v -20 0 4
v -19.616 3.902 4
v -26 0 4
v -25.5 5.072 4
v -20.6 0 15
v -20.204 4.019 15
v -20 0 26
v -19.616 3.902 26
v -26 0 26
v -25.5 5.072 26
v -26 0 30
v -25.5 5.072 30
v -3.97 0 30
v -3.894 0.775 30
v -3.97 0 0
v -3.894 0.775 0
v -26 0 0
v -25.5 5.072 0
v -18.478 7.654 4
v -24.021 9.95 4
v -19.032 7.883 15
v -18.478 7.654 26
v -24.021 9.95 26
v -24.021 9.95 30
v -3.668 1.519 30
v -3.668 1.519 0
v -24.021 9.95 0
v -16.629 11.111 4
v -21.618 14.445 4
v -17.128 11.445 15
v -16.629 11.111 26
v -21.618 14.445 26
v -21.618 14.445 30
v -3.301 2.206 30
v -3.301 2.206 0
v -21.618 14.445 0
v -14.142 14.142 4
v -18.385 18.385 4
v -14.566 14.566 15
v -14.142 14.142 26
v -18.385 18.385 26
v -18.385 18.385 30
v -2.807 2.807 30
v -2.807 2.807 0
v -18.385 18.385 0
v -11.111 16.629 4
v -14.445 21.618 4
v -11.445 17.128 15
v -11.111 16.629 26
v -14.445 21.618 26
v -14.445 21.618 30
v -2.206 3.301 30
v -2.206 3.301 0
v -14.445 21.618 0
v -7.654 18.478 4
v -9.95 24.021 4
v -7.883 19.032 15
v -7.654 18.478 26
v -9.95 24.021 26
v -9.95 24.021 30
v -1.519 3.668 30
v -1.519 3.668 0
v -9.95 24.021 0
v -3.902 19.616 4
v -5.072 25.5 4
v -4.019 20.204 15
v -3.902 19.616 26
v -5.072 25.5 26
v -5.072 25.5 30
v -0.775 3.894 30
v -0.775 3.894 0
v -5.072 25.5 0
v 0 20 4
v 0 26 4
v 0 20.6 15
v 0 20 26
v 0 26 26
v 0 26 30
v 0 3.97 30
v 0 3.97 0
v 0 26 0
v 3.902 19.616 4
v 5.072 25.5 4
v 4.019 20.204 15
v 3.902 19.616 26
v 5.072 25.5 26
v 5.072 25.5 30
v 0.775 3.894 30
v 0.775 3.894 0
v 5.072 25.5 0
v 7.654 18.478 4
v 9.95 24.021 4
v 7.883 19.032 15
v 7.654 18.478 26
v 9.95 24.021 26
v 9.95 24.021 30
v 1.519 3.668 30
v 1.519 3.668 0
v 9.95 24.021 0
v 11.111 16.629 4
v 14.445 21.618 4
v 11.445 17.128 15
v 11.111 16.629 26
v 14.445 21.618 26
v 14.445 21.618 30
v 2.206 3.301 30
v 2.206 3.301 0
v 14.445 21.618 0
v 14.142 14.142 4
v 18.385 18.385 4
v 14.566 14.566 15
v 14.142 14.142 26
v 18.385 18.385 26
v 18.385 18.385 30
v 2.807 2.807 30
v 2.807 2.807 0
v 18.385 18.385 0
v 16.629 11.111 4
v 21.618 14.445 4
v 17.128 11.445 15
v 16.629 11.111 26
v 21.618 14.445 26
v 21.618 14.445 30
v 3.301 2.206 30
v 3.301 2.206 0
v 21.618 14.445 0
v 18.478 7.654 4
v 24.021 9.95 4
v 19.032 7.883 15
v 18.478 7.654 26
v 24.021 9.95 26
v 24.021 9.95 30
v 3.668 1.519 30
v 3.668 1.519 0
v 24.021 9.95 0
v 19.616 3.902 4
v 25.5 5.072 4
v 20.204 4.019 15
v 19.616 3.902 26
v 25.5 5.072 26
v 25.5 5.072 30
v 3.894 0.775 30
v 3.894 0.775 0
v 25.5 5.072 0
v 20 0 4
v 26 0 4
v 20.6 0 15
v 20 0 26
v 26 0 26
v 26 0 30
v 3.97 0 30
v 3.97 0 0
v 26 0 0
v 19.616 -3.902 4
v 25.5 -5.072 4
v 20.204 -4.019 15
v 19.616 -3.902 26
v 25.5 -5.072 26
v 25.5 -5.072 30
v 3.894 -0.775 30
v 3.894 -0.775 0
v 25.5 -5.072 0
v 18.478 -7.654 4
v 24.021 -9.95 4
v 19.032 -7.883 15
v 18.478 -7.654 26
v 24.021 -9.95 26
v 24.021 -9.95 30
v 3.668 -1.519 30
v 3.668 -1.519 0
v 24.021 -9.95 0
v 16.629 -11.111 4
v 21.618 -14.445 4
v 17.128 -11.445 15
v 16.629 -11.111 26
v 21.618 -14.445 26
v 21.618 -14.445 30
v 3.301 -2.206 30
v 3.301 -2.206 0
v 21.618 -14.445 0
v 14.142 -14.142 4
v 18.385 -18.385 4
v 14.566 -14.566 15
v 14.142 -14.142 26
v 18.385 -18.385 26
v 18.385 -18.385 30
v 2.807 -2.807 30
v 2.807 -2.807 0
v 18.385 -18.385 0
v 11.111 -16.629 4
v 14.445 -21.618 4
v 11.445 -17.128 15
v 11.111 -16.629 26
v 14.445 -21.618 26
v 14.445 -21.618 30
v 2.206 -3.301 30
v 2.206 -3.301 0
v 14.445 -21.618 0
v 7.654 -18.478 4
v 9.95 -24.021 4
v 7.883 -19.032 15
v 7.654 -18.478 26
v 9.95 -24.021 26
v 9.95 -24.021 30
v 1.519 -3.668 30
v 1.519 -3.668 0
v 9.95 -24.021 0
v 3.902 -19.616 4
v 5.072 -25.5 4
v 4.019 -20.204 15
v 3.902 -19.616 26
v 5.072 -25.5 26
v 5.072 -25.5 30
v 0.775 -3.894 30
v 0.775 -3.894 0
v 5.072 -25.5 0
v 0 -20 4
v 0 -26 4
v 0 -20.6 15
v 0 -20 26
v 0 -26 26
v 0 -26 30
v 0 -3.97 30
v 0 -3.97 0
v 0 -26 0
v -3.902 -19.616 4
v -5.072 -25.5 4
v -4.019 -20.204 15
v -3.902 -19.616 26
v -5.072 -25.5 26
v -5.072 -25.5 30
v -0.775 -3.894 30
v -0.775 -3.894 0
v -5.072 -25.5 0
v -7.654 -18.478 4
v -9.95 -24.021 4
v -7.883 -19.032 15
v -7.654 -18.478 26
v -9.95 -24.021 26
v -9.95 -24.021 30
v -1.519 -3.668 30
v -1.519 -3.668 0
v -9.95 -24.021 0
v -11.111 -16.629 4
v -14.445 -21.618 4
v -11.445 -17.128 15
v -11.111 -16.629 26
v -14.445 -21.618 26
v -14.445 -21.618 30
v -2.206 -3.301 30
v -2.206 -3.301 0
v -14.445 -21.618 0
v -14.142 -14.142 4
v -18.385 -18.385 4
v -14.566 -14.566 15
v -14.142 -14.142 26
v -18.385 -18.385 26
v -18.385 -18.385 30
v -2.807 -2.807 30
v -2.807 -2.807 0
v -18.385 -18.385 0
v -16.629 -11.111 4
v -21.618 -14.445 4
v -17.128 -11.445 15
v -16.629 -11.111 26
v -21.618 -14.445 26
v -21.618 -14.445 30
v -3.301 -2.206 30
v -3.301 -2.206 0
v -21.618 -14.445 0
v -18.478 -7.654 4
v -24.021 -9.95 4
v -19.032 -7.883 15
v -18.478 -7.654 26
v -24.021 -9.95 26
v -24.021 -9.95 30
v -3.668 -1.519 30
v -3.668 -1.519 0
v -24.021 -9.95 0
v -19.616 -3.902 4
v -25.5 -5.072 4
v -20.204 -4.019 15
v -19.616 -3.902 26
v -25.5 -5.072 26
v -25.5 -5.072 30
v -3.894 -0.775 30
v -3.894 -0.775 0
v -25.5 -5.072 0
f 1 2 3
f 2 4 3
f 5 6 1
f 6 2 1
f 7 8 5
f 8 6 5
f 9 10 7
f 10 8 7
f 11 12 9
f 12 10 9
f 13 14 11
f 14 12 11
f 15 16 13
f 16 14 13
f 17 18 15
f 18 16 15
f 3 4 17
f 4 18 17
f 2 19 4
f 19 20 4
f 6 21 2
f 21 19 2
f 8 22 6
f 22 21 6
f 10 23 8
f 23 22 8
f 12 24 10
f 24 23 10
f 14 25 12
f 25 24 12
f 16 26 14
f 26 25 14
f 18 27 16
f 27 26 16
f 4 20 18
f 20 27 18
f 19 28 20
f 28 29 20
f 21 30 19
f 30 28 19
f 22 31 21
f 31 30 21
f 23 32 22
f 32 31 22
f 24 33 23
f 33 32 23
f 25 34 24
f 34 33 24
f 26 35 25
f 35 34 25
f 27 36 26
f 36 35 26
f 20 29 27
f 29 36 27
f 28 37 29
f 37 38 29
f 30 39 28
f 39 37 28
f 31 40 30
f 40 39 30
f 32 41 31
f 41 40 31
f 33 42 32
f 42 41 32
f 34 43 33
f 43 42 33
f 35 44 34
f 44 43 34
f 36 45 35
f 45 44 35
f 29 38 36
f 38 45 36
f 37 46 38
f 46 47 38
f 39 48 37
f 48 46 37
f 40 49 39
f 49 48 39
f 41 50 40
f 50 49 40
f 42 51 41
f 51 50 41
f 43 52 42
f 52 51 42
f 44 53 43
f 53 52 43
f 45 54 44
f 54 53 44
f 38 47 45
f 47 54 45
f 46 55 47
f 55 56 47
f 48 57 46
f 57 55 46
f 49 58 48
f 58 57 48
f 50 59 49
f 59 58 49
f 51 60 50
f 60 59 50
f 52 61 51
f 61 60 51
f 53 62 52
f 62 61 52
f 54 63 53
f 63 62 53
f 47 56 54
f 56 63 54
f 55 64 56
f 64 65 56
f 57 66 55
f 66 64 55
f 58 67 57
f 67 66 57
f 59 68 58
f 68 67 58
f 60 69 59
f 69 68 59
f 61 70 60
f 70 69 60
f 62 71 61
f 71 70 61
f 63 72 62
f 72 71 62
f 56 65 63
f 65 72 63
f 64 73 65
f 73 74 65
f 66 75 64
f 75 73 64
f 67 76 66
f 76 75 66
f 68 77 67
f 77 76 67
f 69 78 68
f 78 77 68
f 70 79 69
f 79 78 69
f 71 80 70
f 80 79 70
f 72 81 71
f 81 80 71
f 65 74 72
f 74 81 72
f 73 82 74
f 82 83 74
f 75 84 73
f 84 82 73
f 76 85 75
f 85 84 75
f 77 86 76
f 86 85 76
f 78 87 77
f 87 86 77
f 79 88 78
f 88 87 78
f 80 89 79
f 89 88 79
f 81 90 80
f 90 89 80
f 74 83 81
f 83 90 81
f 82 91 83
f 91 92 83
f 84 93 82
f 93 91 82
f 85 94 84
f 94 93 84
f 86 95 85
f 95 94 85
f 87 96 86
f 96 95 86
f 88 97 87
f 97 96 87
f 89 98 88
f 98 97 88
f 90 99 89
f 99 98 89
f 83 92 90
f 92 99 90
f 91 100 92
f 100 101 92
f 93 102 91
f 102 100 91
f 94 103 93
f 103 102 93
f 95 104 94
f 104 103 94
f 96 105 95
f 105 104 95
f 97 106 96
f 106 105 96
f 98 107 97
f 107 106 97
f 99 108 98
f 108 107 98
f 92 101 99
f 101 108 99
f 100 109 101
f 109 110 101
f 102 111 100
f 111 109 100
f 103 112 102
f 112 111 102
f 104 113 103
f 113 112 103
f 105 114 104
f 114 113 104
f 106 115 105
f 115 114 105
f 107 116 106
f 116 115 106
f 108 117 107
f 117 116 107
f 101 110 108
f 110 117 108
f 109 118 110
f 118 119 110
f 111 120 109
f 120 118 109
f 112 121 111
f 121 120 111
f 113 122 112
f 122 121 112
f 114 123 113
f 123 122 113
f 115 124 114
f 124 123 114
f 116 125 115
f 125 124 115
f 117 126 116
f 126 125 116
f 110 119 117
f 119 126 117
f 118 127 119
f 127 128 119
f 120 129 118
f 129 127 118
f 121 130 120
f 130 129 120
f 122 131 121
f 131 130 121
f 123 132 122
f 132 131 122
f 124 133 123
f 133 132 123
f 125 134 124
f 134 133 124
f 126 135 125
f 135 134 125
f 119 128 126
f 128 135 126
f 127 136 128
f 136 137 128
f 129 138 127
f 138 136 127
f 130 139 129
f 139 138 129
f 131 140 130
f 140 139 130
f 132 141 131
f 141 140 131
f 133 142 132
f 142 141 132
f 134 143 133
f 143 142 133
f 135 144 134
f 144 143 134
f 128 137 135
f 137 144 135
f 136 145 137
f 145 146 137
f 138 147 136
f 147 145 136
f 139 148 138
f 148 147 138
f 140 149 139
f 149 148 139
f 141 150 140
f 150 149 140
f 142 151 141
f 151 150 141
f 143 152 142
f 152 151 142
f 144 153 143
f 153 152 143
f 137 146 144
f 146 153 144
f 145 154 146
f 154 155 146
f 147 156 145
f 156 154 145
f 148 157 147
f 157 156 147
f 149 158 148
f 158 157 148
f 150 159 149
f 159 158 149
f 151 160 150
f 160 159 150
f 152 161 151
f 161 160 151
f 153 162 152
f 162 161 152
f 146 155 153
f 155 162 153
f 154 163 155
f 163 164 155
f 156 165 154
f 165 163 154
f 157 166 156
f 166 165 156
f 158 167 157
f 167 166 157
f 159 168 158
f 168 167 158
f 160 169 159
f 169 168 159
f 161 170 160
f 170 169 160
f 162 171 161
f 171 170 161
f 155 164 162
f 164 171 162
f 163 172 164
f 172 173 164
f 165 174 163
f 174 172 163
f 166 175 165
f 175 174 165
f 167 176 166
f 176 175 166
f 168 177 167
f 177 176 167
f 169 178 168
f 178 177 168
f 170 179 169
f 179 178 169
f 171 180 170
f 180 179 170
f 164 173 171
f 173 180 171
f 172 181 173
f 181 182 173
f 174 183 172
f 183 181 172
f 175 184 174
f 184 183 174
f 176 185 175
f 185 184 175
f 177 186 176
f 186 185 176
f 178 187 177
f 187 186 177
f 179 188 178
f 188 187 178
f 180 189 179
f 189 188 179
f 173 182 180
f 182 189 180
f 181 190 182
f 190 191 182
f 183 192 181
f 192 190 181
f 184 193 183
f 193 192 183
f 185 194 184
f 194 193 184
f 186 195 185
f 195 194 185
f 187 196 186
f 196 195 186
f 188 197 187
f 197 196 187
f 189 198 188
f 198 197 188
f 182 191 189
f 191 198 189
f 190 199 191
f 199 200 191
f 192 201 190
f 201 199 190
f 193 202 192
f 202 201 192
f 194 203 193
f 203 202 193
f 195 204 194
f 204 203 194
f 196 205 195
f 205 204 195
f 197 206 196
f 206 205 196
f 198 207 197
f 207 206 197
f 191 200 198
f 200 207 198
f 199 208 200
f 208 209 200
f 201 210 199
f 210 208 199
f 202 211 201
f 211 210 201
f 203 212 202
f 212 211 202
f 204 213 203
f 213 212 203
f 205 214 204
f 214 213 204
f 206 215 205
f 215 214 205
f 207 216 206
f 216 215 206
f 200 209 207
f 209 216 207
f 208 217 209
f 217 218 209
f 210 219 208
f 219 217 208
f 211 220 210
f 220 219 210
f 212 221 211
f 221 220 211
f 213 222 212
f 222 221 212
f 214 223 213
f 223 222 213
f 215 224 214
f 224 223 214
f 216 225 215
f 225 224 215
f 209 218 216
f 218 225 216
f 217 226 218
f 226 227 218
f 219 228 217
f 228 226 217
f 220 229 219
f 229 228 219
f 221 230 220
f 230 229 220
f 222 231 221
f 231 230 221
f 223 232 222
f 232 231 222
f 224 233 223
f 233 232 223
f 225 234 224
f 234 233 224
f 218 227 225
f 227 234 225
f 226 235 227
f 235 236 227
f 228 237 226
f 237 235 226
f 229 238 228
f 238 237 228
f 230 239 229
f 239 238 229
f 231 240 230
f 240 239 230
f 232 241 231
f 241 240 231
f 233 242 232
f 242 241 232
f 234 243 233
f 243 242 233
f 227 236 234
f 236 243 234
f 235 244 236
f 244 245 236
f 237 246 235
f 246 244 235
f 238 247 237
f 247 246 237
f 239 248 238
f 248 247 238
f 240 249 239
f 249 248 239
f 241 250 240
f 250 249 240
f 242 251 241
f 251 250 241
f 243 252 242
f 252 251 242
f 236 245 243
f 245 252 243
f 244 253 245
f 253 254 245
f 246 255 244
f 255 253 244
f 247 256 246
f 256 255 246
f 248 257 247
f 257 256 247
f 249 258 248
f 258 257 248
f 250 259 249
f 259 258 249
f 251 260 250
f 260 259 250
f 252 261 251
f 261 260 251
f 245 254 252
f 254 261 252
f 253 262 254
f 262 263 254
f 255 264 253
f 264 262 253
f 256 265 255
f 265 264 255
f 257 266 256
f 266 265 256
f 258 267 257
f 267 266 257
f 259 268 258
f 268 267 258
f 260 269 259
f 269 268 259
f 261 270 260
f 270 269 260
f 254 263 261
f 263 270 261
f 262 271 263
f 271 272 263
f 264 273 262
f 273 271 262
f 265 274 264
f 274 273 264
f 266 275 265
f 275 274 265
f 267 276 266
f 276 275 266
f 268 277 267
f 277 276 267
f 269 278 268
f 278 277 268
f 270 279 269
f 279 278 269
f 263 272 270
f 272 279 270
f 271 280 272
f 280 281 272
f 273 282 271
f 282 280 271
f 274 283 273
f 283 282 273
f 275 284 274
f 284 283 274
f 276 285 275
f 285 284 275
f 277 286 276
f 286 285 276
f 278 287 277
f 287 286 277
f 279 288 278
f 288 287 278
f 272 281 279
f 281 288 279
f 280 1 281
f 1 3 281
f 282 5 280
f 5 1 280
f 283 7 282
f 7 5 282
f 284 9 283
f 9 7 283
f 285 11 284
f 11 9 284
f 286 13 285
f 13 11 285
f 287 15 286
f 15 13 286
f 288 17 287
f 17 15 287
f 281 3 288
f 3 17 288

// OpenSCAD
$fn = 32;

// ----------------------------------------------------------------------
// Belt roller: 40 mm barrel, 30 mm wide, bore 7.94 mm
// ----------------------------------------------------------------------

// --- parameters (mm) ---
bore_d = 7.94;            // bore
barrel_d = 40;            // barrel diameter
roller_w = 30;            // roller width
flange_d = 52;            // flange diameter
flange_t = 4;             // flange thickness
hub_d = 31.94;            // hub diameter

roller_profile = [[3.97, 0], [26, 0], [26, 4], [20, 4], [20.6, 15], [20, 26], [26, 26], [26, 30], [3.97, 30]];

/* the profile stays clear of the axis, so the bore comes out of the revolve */
rotate_extrude() polygon(roller_profile);
